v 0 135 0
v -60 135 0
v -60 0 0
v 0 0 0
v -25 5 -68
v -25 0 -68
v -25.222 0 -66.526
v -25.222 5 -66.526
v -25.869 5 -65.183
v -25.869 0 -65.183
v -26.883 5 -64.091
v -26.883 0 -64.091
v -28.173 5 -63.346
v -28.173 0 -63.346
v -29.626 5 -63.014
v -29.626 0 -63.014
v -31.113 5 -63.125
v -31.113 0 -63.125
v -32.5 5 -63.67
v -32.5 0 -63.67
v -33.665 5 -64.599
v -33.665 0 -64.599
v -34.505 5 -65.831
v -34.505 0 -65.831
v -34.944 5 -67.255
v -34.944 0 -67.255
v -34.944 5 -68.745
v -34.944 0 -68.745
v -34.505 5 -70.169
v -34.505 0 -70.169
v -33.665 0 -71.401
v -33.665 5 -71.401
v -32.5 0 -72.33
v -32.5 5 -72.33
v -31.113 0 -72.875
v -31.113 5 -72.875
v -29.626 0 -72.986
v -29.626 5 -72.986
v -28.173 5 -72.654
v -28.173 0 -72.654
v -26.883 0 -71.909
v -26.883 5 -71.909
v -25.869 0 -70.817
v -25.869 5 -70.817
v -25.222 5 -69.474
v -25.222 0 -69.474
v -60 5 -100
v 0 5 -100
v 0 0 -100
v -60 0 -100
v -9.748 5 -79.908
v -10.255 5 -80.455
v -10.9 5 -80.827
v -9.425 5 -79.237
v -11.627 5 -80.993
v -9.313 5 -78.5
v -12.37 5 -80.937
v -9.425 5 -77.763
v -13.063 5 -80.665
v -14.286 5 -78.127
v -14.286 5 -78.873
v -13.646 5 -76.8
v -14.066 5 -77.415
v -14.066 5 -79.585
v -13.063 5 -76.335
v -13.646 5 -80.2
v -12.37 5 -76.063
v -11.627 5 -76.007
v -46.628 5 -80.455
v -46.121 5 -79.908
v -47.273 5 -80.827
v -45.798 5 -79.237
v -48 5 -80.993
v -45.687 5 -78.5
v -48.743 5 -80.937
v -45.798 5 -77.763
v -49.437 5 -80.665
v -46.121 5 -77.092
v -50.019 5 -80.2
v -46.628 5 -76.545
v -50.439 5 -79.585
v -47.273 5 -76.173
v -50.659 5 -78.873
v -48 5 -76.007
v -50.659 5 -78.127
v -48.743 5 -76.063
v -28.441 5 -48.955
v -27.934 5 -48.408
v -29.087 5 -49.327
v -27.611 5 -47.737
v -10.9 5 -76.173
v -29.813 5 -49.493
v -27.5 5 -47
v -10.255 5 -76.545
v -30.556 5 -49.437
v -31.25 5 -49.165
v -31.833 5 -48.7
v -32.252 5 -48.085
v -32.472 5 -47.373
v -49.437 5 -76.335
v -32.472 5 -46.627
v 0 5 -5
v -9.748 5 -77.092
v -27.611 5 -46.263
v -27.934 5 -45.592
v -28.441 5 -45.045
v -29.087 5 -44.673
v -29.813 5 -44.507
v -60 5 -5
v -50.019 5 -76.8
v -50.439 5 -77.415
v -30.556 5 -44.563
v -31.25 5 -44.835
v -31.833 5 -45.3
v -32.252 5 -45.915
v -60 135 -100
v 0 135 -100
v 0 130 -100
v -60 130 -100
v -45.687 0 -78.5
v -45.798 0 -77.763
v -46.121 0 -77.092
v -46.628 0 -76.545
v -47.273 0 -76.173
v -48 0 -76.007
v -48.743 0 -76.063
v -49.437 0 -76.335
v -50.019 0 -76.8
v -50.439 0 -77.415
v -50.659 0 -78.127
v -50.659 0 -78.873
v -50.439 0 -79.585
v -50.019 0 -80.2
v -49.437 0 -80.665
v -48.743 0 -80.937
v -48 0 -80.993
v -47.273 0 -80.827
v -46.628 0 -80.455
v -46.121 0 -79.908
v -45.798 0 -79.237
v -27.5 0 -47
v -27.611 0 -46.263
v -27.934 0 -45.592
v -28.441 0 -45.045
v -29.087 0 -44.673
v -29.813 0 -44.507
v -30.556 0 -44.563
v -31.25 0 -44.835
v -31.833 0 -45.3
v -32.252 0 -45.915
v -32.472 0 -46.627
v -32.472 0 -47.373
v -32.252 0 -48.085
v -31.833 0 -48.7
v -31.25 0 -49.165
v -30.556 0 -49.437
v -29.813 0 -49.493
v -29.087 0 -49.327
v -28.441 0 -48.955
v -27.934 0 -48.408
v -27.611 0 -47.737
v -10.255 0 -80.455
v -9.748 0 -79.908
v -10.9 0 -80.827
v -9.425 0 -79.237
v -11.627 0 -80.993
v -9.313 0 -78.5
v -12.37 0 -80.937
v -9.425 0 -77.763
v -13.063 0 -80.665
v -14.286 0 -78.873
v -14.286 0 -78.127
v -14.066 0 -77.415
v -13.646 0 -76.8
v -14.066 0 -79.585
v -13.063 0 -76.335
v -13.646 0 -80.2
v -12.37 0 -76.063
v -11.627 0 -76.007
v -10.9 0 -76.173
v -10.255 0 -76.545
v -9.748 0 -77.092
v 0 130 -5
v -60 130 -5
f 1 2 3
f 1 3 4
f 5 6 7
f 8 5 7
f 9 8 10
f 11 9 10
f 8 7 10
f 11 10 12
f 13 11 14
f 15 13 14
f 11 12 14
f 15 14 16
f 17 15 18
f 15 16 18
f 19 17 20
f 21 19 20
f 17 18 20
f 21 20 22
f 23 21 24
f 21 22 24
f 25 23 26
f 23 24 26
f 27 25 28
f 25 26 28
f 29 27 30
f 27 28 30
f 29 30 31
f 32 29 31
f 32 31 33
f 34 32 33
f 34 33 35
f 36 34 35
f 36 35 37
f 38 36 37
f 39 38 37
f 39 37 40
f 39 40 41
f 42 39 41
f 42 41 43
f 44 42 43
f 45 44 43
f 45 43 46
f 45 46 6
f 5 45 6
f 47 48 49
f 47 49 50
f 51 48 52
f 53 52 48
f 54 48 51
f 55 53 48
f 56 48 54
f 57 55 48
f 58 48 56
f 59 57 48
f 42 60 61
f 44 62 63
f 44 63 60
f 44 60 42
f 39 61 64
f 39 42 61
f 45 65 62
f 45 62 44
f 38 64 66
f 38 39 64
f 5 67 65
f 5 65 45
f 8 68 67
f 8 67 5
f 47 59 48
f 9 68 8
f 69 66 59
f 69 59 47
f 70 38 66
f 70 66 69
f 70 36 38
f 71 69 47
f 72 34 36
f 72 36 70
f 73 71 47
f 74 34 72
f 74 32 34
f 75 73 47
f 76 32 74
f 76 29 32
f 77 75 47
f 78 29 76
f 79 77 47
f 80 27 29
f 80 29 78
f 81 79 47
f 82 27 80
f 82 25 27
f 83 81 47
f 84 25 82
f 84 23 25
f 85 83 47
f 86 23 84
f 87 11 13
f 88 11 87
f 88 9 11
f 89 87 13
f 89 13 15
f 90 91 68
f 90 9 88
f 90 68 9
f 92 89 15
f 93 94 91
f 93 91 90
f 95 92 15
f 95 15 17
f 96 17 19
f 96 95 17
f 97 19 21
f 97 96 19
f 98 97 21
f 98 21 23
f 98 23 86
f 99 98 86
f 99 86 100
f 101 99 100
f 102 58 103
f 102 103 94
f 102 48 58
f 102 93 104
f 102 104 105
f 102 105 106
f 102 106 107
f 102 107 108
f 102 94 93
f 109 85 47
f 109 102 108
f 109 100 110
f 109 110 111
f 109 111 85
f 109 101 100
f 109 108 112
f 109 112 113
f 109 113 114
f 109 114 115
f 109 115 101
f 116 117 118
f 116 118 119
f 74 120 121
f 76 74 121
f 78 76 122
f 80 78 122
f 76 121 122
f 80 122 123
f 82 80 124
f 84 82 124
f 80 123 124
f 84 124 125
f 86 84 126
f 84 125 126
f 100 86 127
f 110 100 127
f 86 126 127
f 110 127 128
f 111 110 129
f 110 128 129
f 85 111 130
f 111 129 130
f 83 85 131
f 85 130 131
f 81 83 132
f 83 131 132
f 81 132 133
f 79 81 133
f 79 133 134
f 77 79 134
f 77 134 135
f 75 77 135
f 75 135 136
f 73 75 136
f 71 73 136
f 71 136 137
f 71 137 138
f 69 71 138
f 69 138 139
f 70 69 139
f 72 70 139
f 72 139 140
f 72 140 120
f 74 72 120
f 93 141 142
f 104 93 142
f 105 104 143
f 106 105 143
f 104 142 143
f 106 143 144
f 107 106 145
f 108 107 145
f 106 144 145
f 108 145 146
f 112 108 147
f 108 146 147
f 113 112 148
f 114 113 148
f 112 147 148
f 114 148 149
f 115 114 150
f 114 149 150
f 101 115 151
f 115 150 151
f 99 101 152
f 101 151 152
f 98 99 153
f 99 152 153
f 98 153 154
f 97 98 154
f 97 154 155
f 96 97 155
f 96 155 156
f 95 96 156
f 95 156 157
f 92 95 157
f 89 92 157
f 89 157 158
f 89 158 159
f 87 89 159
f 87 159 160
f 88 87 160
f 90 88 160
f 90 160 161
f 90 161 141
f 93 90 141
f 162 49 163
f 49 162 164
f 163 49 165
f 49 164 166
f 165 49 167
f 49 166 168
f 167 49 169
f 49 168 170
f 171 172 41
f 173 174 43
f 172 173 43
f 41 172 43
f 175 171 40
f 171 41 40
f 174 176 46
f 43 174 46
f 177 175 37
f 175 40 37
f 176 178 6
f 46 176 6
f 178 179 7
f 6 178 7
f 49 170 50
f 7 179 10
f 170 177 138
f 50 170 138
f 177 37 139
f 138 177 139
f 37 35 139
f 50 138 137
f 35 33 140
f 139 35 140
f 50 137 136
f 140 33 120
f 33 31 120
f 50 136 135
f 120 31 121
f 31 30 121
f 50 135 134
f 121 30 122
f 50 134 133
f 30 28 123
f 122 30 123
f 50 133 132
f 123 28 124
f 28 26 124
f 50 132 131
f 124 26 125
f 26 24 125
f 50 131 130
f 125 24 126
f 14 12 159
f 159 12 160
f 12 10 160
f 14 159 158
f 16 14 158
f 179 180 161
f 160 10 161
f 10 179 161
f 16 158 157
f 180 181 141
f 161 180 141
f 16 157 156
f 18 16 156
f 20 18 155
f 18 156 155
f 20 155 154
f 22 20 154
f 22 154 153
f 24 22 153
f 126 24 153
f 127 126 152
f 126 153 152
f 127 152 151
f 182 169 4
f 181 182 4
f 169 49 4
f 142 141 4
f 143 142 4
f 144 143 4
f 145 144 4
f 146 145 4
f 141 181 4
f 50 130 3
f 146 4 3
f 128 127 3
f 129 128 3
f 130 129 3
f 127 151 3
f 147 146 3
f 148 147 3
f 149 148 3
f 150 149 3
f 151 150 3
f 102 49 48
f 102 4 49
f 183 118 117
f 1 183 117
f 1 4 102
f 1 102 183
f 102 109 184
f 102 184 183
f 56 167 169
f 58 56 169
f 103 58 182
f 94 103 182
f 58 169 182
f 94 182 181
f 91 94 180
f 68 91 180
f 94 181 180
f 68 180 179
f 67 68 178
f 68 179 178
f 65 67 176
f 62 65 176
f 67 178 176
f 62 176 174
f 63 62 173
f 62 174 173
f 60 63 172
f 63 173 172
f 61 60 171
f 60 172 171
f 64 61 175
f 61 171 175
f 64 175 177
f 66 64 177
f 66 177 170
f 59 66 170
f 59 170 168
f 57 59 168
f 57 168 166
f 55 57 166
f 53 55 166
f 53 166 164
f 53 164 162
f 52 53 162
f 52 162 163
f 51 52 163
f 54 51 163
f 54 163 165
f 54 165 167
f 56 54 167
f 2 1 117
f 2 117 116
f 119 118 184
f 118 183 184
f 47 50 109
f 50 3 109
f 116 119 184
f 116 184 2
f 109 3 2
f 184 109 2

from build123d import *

# Parameters (mm, degrees)
SKETCH1_W           = 60
SKETCH1_H           = 100
BOSS_EXTRUDE1_DEPTH = 5
SKETCH2_W           = 60
SKETCH2_H           = 5
BOSS_EXTRUDE2_DEPTH = 130
SKETCH3_W           = 60
SKETCH3_H           = 5
BOSS_EXTRUDE3_DEPTH = 55
SKETCH9_W           = 60
SKETCH9_H           = 40
CUT_EXTRUDE1_DEPTH  = 55
SKETCH11_W          = 60
SKETCH11_H          = 5
BOSS_EXTRUDE4_DEPTH = 40
SKETCH12_W          = 60
SKETCH12_H          = 5
BOSS_EXTRUDE5_DEPTH = 40
SKETCH13_R          = 5
CUT_EXTRUDE2_DEPTH  = 40
SKETCH14_R          = 2.5
CUT_EXTRUDE3_DEPTH  = 40


with BuildPart() as part:
    # Sketch1 → Boss-Extrude1 (new body)
    with BuildSketch(Plane(origin=(0, 0, 0), x_dir=(1, 0, 0), z_dir=(0, 1, 0))):
        with Locations((-30, 50)):
            Rectangle(SKETCH1_W, SKETCH1_H)
    extrude(amount=BOSS_EXTRUDE1_DEPTH)

    # Sketch2 → Boss-Extrude2 (add)
    with BuildSketch(Plane(origin=(0, 5, 0), x_dir=(1, 0, 0), z_dir=(0, 1, 0))):
        with Locations((-30, 2.5)):
            Rectangle(SKETCH2_W, SKETCH2_H)
    extrude(amount=BOSS_EXTRUDE2_DEPTH)

    # Sketch3 → Boss-Extrude3 (add)
    with BuildSketch(Plane(origin=(0, 0, -5), x_dir=(-1, 0, 0), z_dir=(0, 0, -1))):
        with Locations((30, 132.5)):
            Rectangle(SKETCH3_W, SKETCH3_H)
    extrude(amount=BOSS_EXTRUDE3_DEPTH)

    # Sketch9 → Cut-Extrude1 (cut)
    with BuildSketch(Plane(origin=(0, 0, 0), x_dir=(-1, 0, 0), z_dir=(0, -1, 0))):
        with Locations((30, 80)):
            Rectangle(SKETCH9_W, SKETCH9_H)
    extrude(amount=-CUT_EXTRUDE1_DEPTH, mode=Mode.SUBTRACT)

    # Sketch11 → Boss-Extrude4 (add)
    with BuildSketch(Plane(origin=(0, 0, -60), x_dir=(-1, 0, 0), z_dir=(0, 0, -1))):
        with Locations((30, 132.5)):
            Rectangle(SKETCH11_W, SKETCH11_H)
    extrude(amount=BOSS_EXTRUDE4_DEPTH)

    # Sketch12 → Boss-Extrude5 (add)
    with BuildSketch(Plane(origin=(0, 0, -60), x_dir=(-1, 0, 0), z_dir=(0, 0, -1))):
        with Locations((30, 2.5)):
            Rectangle(SKETCH12_W, SKETCH12_H)
    extrude(amount=BOSS_EXTRUDE5_DEPTH)

    # Sketch13 → Cut-Extrude2 (cut)
    with BuildSketch(Plane.XZ):
        with Locations((-30, -68)):
            Circle(SKETCH13_R)
    extrude(amount=-CUT_EXTRUDE2_DEPTH, mode=Mode.SUBTRACT)

    # Sketch14 → Cut-Extrude3 (cut)
    with BuildSketch(Plane.XZ):
        with Locations((-30, -47)):
            Circle(SKETCH14_R)
        with Locations((-48.186533479, -78.5)):
            Circle(SKETCH14_R)
        with Locations((-11.813466521, -78.5)):
            Circle(SKETCH14_R)
    extrude(amount=-CUT_EXTRUDE3_DEPTH, mode=Mode.SUBTRACT)


solid = part.part
